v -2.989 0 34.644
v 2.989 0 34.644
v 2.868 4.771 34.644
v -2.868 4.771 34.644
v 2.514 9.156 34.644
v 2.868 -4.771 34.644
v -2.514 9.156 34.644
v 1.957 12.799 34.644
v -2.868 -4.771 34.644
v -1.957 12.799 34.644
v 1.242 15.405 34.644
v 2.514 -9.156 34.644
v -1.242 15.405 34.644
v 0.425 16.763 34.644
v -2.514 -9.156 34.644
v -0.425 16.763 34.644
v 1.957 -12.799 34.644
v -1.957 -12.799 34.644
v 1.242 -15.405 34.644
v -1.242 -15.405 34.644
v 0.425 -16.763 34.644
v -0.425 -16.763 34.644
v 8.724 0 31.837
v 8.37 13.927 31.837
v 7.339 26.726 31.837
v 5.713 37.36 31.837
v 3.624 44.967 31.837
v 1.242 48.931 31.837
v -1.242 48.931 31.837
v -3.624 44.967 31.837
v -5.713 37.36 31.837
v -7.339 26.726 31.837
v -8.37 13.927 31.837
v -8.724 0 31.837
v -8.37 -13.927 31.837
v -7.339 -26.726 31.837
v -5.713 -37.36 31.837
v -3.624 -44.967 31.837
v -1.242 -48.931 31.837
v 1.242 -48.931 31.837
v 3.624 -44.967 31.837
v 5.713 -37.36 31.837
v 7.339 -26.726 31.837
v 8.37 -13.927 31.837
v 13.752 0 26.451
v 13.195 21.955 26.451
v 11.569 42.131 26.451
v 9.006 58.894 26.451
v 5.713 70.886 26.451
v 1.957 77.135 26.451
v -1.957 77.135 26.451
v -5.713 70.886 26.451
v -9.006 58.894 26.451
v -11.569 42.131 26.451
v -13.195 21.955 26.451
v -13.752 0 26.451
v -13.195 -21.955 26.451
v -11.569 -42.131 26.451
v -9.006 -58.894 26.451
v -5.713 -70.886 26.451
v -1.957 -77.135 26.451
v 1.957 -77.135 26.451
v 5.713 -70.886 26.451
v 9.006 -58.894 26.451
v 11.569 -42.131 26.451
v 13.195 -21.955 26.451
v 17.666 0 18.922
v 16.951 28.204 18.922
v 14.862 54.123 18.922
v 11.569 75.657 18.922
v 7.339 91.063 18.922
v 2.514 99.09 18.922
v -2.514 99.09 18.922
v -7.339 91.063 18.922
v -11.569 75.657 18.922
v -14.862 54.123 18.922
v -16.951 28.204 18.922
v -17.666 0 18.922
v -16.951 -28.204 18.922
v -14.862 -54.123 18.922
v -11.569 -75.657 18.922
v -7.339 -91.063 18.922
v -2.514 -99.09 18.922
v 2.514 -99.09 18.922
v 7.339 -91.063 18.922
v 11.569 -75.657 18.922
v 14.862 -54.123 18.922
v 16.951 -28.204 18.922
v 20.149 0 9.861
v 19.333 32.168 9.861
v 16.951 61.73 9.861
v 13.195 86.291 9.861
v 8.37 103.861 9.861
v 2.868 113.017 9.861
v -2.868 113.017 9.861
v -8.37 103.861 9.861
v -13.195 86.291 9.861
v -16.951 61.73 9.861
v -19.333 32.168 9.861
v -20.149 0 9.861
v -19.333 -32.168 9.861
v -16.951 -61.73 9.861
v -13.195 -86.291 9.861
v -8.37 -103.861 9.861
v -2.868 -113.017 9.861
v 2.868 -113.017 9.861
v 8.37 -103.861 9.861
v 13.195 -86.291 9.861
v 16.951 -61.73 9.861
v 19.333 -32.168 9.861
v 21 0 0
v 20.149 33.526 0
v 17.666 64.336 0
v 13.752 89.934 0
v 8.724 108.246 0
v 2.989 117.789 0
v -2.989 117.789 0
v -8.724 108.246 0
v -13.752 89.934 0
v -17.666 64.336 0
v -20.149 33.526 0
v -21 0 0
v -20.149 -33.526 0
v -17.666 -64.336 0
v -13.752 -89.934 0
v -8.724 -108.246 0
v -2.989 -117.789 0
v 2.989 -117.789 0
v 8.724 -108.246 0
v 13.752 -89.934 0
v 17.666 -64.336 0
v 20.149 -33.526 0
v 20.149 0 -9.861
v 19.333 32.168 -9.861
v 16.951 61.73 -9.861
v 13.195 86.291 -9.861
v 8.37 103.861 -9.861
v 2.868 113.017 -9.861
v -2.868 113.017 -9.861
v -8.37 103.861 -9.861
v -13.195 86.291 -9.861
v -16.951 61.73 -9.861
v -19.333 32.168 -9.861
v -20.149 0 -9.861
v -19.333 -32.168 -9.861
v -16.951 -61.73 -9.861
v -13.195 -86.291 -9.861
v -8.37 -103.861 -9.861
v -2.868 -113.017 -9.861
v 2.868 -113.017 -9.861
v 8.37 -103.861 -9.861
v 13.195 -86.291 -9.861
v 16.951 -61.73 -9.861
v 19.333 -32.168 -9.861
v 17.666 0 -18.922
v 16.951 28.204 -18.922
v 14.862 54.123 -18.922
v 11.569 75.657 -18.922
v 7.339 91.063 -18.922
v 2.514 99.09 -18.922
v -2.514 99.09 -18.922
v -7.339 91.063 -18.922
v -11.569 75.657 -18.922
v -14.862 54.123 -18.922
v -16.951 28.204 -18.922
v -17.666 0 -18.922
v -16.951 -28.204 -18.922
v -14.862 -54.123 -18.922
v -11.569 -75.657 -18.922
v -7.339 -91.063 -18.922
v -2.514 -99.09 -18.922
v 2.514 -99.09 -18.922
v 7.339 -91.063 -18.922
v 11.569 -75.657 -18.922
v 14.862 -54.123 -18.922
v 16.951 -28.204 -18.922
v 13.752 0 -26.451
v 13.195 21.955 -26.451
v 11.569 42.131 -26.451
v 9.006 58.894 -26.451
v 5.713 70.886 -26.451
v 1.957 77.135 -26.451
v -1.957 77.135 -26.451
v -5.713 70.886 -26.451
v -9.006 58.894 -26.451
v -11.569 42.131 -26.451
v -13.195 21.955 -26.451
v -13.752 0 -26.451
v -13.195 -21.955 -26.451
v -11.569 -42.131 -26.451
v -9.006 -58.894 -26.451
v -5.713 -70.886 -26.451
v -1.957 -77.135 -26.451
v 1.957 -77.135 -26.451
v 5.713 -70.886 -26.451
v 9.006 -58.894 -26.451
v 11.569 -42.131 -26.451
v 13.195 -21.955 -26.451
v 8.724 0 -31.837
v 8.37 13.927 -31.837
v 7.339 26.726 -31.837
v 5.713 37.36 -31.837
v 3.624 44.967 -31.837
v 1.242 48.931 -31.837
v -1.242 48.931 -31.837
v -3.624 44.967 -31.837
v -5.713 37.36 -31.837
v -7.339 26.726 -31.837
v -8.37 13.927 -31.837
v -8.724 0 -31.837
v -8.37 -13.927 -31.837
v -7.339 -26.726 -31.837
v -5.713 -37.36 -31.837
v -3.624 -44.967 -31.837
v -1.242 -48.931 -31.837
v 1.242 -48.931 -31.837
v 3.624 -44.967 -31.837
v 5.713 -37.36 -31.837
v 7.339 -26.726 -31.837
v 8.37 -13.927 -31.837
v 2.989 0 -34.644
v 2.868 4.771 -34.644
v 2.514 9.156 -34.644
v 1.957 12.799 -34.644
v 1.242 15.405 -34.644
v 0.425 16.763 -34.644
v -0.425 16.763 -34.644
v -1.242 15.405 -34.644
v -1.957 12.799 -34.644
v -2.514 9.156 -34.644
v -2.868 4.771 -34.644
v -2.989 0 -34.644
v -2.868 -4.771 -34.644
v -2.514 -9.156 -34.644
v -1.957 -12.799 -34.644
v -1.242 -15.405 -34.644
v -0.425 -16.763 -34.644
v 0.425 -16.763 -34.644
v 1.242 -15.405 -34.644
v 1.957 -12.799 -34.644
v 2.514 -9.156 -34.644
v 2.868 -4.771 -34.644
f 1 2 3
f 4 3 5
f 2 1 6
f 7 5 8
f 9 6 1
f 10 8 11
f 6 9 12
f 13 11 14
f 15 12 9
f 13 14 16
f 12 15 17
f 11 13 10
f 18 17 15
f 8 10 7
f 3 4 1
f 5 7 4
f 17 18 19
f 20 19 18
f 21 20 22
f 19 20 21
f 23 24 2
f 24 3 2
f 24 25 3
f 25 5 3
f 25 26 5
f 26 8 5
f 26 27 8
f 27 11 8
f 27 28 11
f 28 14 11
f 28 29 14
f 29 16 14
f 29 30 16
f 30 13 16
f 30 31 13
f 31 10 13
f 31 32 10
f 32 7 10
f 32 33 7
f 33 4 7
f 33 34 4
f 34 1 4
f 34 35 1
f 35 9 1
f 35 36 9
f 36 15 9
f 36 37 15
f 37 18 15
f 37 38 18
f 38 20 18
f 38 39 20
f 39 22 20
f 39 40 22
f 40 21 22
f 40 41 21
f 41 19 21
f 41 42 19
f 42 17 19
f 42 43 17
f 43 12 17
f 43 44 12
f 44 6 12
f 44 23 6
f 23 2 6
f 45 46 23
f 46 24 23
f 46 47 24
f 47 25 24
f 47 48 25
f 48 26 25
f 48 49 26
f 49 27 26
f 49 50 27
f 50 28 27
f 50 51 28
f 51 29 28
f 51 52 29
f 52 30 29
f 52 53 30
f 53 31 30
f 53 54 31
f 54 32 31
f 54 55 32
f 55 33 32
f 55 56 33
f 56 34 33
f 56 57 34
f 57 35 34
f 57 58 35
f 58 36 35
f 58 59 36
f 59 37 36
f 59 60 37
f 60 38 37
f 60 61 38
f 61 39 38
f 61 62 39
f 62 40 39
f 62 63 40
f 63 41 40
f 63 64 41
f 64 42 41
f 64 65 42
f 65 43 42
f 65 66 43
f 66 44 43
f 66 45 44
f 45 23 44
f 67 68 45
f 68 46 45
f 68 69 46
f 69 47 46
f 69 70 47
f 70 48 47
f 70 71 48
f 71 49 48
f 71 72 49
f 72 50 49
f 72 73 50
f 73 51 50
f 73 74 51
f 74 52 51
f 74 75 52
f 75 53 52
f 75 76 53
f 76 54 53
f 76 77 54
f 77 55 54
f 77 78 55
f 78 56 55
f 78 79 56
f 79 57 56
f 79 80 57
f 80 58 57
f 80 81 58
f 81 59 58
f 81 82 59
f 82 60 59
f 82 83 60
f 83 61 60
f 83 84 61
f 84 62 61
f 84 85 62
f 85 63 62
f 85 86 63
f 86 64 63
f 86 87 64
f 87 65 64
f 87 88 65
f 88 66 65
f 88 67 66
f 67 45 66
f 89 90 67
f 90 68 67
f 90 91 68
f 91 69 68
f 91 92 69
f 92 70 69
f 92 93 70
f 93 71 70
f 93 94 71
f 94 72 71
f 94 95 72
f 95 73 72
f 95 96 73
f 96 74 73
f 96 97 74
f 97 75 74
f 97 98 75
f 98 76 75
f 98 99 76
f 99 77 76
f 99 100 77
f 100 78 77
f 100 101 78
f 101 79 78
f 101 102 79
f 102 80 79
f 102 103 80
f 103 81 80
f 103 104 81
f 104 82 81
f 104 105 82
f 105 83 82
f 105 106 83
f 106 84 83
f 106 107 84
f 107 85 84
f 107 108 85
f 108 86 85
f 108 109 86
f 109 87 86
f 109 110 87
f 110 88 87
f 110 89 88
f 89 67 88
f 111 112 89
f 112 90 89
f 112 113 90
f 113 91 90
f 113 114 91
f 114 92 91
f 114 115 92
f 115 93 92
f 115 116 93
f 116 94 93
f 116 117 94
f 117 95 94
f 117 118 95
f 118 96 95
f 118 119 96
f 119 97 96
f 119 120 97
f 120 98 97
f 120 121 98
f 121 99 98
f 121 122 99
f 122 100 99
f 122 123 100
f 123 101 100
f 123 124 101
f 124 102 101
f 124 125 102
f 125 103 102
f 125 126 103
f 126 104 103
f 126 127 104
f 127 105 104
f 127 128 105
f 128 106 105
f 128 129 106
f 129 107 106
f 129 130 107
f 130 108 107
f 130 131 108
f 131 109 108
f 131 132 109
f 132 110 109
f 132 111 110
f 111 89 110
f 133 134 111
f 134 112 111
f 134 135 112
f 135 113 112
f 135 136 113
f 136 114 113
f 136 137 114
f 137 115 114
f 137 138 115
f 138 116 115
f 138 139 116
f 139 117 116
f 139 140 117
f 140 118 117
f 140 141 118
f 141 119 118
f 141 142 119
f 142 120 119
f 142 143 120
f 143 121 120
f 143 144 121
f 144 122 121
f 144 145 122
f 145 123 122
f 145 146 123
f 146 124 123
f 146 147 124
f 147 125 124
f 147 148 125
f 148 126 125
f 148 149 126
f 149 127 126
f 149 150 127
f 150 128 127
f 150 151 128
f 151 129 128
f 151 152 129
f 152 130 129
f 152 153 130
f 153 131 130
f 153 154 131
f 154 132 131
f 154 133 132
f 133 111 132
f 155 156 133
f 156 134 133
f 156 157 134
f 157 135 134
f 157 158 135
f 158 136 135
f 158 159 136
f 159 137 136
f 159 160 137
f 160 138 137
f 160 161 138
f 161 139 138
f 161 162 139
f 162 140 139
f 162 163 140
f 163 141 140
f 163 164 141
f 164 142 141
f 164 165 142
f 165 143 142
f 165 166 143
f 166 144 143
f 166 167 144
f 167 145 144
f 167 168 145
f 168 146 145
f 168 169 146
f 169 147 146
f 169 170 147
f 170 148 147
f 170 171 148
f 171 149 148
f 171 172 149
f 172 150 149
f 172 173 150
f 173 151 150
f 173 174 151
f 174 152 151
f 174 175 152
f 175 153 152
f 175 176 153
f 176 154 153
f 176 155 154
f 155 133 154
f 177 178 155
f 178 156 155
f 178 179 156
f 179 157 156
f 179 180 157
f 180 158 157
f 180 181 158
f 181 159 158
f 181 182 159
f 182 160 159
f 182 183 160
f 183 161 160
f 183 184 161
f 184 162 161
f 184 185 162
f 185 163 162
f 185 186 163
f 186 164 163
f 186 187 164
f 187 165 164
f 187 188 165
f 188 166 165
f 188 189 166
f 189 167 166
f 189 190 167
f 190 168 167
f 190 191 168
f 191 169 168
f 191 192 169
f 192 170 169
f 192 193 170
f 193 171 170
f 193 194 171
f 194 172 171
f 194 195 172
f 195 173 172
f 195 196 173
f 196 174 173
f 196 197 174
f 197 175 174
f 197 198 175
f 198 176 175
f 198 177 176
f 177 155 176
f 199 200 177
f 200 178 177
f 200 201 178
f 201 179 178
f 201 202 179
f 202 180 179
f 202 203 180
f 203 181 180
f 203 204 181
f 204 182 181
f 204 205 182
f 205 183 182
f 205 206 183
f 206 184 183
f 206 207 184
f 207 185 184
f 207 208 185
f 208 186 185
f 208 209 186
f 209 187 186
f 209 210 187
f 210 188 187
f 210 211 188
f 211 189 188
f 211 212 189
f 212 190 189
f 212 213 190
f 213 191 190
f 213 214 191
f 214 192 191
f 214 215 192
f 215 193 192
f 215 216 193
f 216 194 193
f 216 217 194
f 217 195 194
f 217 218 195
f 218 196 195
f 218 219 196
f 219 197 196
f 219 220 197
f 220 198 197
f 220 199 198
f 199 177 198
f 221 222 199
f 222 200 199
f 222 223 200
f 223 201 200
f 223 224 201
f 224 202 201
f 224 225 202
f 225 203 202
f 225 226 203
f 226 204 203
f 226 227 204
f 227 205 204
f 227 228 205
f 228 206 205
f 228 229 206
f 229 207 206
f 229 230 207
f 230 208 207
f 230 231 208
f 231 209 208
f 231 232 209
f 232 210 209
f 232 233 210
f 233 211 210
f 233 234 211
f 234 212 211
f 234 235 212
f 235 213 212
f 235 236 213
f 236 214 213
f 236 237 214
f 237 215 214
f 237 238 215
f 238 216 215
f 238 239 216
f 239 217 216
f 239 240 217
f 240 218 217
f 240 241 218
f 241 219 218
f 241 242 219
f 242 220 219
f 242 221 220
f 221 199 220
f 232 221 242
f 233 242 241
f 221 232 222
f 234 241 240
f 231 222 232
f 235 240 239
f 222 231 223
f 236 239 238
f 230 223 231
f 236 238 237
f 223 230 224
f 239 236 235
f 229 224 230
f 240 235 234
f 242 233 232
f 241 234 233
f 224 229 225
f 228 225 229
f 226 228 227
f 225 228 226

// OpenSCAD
// Generated by SolidPython 1.0.1 on 2020-07-29 00:46:45


scale(v = [3, 17, 5]) {
	sphere(r = 7);
}
/***********************************************
*********      SolidPython code:      **********
************************************************
 
# import packages: SolidPython
from solid import *
from solid.utils import *
from itertools import chain, combinations, permutations


class Resize:

    def __init__(self, scad_file):
        self.scad_file = scad_file
        #self.scad_file = import_scad(scad_file)
        # cone/cylinder param:
        self.r1 = 0
        self.r2 = 0
        self.h = 0
        # rectangular prism param:
        self.w = 0
        self.l = 0
        # ellipse param:
        self.r = 0

    # import OpenScad code (file name corresponds to shape)


    # classify shape + parameters
    def assign(self, param1, param2, param3):
        if self.scad_file == 'cone.scad':
            self.r1 = param1
            self.r2 = param2
            self.h = param3
        elif self.scad_file == 'cylinder.scad':
            self.r1 = param1
            self.r2 = param2
            self.h = param3
        elif self.scad_file == 'rectangularPrism.scad':
            self.h = param1
            self.l = param2
            self.w = param3
        else:
            self.r = param1
            self.h = param2

    # resize parameters
    def iterate(self):
        x = range(3, 20, 2)
        i = 1
        if self.scad_file == 'cone.scad':
            tempList = list(permutations(x, 2))
            for temp in tempList:
                param1 = temp[0]
                param2 = temp[1]
                filepath = 'produced_scad_files/' + 'cone' + str(param1) + '_' + str(param2) + '_' + '.scad'
                scad_render_to_file(cylinder(h=param1, r1=param2, r2=0), filepath)

        elif self.scad_file == 'cylinder.scad':
            tempList = list(permutations(x, 3))
            for temp in tempList:
                param1 = temp[0]
                param2 = temp[1]
                filepath = 'produced_scad_files/' + 'cylinder' + str(param1) + '_' + str(param2) + '_' + '.scad'
                scad_render_to_file(cylinder(h=param1, r1=param2, r2=param2), filepath)

        elif self.scad_file == 'rectangularPrism.scad':
            tempList = list(permutations(x, 3))
            for temp in tempList:
                param1 = temp[0]
                param2 = temp[1]
                param3 = temp[2]
                filepath = 'produced_scad_files/' + 'rectangularPrism' + str(param1) + '_' + str(param2) + '_' + str(
                    param3) + '.scad'
                scad_render_to_file(cube(size=(param1, param2, param3)), filepath)

        elif self.scad_file == 'ellipse.scad':
            tempList = list(permutations(x, 4))
            for temp in tempList:
                param1 = temp[0]
                param2 = temp[1]
                param3 = temp[2]
                param4 = temp[3]
                filepath = 'produced_scad_files/' + 'ellipse' + str(param1) + '_' + str(param2) + '_' + str(param3) + '_' + str(param4) + '.scad'
                scad_render_to_file(scale([param1, param2, param3])(sphere(r=param4)), filepath)

    def render_to_scadfile(self):
        scad_render_to_file(scad, 'example.scad') 
 
************************************************/
